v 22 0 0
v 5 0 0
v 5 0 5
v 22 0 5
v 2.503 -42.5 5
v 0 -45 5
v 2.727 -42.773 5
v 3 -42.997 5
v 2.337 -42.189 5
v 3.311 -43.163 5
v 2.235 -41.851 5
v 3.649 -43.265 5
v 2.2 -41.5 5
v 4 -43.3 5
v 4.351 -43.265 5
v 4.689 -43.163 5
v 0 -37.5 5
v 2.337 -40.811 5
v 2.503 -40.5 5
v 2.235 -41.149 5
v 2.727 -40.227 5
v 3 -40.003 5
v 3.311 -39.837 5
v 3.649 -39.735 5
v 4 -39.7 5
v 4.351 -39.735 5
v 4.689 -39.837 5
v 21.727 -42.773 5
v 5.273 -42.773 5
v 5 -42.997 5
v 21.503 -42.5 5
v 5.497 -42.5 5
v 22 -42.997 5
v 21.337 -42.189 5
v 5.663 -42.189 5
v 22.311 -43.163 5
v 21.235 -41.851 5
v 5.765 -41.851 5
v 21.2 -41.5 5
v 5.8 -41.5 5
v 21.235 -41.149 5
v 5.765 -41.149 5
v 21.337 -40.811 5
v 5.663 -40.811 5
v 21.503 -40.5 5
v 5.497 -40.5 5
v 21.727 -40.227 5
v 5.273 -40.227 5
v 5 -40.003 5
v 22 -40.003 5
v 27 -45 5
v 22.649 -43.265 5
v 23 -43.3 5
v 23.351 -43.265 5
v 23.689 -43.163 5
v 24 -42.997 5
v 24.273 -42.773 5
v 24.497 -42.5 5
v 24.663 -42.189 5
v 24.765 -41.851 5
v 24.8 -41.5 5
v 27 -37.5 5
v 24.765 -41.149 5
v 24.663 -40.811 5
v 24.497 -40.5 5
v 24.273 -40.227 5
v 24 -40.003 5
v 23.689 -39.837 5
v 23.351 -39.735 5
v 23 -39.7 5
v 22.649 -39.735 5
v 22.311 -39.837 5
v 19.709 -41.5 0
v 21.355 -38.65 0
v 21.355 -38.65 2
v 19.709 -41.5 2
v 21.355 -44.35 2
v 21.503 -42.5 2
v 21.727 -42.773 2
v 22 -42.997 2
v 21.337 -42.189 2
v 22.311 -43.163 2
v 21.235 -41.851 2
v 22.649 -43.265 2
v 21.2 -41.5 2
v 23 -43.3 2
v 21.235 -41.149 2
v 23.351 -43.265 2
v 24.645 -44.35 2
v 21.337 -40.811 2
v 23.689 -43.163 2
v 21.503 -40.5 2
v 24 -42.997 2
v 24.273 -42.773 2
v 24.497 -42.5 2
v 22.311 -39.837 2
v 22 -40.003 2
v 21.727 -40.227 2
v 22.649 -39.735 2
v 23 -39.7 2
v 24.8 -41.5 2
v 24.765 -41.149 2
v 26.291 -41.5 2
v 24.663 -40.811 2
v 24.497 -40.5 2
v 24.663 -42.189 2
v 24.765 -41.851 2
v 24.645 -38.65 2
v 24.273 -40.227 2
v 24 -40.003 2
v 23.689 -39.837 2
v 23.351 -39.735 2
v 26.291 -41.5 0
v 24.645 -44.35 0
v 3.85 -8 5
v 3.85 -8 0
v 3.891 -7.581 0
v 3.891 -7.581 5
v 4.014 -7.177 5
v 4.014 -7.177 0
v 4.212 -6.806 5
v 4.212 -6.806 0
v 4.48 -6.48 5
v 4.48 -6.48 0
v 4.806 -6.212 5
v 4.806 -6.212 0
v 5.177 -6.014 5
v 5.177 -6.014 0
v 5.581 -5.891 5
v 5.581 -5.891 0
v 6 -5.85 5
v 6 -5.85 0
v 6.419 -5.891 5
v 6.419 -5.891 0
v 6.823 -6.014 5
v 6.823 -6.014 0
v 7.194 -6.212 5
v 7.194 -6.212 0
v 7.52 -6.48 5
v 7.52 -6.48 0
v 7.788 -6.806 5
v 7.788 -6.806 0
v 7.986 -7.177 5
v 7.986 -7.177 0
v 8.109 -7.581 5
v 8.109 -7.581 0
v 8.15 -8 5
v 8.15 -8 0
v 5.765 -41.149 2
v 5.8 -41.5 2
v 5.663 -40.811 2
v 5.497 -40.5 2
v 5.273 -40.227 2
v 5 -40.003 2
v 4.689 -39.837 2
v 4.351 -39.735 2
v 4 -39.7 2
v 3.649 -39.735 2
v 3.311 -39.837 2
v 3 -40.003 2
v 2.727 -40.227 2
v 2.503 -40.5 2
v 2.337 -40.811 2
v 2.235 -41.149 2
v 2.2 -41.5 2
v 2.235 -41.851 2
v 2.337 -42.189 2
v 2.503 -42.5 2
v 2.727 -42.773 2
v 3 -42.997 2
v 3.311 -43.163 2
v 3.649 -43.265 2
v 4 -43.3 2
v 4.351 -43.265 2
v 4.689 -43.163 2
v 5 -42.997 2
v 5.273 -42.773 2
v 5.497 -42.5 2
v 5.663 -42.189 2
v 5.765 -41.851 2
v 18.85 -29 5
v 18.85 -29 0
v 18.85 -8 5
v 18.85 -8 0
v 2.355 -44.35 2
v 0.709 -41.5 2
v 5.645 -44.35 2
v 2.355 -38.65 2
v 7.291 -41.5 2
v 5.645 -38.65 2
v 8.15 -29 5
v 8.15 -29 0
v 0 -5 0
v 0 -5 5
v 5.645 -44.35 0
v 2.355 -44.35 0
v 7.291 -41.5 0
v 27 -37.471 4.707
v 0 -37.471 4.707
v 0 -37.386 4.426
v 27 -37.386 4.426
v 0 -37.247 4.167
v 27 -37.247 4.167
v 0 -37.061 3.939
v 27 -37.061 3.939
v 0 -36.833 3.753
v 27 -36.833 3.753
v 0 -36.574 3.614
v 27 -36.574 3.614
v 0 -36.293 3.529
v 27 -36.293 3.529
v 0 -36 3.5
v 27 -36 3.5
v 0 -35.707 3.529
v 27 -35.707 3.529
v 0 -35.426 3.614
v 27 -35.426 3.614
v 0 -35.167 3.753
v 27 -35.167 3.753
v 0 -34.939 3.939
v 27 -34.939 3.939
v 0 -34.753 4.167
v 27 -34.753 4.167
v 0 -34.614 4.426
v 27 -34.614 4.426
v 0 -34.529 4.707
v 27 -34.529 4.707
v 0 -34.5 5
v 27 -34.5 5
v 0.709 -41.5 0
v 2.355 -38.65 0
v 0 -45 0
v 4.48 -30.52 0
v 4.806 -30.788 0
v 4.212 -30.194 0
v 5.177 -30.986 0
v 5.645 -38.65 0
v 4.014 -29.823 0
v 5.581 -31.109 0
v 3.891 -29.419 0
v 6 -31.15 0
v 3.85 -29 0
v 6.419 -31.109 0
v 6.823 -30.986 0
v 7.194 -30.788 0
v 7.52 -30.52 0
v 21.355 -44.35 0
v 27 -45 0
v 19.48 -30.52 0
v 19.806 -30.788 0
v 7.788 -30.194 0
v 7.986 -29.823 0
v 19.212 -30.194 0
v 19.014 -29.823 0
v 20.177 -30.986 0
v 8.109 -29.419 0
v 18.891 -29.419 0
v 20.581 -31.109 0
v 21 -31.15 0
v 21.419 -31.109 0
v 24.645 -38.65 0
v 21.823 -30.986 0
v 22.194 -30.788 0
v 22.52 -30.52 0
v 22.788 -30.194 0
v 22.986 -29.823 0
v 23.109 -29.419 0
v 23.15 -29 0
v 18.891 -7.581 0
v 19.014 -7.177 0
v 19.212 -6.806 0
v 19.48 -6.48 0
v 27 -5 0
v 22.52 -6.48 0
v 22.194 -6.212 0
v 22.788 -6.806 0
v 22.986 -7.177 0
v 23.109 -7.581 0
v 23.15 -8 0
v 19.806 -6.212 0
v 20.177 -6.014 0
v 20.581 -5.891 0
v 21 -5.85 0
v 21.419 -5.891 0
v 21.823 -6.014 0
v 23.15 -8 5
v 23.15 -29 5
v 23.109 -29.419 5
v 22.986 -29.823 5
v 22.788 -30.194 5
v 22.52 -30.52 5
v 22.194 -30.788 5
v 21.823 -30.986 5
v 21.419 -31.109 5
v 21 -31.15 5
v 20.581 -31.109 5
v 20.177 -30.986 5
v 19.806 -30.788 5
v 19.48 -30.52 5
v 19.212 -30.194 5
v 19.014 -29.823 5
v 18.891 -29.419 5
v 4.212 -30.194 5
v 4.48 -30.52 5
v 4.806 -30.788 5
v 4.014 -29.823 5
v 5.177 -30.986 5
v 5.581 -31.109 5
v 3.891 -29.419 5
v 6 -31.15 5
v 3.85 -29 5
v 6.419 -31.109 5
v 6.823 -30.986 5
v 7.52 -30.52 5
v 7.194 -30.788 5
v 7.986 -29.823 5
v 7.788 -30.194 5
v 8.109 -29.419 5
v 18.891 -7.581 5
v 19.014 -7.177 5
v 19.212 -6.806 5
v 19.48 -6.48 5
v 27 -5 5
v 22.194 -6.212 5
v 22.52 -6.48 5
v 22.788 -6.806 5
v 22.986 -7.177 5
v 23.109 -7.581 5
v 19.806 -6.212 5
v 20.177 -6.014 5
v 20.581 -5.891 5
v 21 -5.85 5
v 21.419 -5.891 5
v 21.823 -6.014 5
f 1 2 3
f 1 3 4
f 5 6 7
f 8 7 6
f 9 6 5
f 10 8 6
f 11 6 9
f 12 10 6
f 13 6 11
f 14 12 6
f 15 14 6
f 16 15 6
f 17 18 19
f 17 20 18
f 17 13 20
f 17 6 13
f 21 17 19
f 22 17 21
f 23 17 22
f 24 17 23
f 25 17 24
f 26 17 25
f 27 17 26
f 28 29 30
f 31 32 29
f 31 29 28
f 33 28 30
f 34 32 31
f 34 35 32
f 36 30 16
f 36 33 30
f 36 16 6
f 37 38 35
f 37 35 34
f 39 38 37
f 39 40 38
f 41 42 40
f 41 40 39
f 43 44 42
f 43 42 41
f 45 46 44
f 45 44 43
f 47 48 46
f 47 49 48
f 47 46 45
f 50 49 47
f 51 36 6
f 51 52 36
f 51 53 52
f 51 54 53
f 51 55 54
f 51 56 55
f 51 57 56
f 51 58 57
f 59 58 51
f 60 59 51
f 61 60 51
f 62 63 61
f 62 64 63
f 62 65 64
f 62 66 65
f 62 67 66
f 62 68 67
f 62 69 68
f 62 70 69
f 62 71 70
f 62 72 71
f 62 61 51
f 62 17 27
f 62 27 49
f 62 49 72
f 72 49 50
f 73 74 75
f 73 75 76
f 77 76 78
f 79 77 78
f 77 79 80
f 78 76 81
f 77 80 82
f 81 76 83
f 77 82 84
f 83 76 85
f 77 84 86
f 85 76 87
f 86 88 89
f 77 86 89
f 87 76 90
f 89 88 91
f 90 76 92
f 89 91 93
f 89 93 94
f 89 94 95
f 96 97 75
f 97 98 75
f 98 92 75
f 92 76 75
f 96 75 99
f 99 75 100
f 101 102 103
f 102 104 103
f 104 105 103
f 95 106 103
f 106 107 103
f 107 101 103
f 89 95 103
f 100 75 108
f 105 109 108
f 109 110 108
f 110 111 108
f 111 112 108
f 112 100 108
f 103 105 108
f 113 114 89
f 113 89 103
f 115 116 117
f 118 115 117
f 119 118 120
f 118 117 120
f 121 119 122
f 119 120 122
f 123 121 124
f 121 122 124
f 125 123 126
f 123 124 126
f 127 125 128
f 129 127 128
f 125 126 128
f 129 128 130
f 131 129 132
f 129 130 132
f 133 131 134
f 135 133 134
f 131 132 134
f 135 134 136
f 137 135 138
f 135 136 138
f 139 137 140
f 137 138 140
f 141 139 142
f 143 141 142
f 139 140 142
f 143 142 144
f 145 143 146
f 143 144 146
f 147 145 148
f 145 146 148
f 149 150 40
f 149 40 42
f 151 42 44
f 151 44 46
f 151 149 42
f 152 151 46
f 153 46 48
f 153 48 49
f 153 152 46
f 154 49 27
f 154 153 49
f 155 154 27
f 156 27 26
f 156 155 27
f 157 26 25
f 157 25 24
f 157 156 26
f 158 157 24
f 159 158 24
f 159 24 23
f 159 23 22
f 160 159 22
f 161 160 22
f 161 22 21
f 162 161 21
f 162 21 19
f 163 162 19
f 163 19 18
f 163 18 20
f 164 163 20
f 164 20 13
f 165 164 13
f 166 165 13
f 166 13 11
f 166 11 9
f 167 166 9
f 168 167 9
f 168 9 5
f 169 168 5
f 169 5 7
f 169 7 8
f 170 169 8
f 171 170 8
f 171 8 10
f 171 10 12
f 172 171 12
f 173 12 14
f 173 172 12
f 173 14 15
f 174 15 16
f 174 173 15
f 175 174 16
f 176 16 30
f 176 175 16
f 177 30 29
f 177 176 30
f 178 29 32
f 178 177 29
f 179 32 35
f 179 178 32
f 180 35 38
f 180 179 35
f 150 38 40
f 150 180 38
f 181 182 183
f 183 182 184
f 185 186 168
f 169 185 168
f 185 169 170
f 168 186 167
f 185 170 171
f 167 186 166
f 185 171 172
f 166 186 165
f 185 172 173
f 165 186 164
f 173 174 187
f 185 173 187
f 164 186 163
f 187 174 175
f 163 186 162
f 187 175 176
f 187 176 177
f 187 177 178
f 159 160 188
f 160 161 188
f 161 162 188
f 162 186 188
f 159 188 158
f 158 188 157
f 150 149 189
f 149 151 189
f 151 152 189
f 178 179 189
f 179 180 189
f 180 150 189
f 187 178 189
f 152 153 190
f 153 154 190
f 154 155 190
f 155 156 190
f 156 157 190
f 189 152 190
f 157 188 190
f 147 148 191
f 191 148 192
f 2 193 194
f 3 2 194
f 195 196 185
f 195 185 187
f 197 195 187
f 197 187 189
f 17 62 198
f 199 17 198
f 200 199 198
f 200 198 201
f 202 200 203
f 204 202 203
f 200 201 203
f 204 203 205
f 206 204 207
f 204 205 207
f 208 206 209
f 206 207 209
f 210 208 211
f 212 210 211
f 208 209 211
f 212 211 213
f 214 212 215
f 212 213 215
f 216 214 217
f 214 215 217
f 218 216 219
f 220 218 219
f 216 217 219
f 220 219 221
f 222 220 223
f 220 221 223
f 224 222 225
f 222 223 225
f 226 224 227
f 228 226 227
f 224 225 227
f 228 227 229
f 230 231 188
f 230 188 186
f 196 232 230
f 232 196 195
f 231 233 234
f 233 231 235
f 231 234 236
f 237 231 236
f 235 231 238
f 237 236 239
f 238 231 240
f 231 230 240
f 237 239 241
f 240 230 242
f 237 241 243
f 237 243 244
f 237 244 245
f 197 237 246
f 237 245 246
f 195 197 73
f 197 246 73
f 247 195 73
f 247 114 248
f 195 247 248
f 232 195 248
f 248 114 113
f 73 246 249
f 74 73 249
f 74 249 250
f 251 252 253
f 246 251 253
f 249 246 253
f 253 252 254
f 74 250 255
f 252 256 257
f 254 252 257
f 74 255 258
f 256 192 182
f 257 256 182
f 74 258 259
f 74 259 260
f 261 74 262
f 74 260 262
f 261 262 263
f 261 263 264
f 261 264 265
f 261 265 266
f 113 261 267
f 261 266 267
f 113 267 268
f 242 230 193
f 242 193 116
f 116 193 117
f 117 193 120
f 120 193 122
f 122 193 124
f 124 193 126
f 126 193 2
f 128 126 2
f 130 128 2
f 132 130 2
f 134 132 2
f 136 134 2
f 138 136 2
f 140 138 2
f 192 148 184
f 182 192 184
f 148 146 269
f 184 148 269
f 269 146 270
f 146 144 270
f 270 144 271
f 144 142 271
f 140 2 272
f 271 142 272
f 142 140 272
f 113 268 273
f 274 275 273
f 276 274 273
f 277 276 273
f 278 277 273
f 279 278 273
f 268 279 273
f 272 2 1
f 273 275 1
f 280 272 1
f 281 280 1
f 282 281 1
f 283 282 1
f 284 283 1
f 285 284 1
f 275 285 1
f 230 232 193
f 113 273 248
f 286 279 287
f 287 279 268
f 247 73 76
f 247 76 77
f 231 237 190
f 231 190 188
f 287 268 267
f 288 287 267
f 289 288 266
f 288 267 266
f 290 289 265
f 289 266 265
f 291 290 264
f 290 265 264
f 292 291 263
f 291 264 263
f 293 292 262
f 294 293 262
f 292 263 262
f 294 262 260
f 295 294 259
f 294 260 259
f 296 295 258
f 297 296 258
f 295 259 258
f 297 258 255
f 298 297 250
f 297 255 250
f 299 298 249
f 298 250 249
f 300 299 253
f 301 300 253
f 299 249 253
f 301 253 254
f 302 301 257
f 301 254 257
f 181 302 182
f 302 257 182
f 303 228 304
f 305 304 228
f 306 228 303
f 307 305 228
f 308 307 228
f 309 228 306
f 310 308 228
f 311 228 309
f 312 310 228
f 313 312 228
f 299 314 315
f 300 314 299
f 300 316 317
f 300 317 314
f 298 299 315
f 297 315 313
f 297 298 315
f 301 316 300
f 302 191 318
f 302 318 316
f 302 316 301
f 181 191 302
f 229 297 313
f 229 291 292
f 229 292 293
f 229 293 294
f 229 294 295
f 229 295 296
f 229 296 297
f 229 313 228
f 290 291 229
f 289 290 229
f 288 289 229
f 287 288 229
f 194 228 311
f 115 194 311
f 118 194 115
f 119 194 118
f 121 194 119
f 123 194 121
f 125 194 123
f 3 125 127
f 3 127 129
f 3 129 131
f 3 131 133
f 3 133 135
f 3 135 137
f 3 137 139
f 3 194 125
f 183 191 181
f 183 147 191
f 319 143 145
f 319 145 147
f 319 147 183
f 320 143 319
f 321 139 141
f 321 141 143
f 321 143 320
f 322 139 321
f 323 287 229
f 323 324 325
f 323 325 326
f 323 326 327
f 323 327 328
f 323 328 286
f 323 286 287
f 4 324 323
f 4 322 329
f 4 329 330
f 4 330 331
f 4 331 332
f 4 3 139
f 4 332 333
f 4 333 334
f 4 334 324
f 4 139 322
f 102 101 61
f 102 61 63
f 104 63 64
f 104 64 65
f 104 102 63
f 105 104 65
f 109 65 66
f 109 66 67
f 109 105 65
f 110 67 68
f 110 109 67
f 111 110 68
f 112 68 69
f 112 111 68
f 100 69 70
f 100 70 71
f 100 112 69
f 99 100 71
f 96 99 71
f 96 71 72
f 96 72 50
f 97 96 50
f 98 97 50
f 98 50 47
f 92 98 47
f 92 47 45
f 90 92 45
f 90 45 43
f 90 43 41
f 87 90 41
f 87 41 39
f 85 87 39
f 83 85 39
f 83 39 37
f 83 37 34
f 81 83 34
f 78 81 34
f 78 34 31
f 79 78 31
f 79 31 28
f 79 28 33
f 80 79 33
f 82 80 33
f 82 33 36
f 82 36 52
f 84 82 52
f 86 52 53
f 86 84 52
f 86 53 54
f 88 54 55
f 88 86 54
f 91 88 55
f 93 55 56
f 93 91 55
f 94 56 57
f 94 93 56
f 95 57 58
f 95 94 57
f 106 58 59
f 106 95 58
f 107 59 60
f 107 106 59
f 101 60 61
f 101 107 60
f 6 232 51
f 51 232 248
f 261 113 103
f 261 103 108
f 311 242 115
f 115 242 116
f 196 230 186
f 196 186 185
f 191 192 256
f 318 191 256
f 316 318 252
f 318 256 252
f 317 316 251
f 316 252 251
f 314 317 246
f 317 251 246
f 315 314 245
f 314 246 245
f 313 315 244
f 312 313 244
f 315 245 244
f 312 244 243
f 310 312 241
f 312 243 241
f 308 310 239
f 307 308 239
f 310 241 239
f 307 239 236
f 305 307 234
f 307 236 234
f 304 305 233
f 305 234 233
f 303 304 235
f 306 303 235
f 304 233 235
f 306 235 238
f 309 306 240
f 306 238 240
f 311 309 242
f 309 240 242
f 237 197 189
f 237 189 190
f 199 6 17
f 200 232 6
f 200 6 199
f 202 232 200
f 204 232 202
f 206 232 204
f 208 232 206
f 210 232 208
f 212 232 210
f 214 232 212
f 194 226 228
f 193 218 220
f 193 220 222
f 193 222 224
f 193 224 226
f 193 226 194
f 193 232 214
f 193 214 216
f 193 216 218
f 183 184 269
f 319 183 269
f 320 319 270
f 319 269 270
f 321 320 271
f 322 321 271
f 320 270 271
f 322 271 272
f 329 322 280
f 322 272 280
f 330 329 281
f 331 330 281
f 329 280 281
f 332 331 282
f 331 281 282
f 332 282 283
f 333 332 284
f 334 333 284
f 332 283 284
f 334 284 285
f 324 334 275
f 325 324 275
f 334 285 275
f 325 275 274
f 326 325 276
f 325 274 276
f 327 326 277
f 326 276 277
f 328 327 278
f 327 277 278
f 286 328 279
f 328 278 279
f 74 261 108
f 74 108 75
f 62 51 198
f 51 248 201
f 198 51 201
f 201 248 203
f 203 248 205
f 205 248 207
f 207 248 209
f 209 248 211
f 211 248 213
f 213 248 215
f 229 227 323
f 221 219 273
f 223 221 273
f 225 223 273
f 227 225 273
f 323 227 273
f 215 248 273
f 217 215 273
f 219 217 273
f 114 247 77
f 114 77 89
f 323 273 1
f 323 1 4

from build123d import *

# Parameters (mm, degrees)
F0_W     = 27
F0_H     = 45
F0_R     = 1.8
F1_DEPTH = 5
F3_DEPTH = 27
F4_DEPTH = 2
F5_SIZE  = 5


with BuildPart() as f1:
    # F0 (on Top) → F1 (new body)
    with BuildSketch(Plane.XY):
        with Locations((13.5, -22.5)):
            Rectangle(F0_W, F0_H)
        Polygon((0.709103, -41.5), (2.354552, -38.65), (5.645448, -38.65), (7.290897, -41.5), (5.645448, -44.35), (2.354552, -44.35), align=None, mode=Mode.SUBTRACT)
        Polygon((19.709103, -41.5), (21.354552, -38.65), (24.645448, -38.65), (26.290897, -41.5), (24.645448, -44.35), (21.354552, -44.35), align=None, mode=Mode.SUBTRACT)
        with BuildLine():
            Line((3.85, -29), (3.85, -8))
            ThreePointArc((3.85, -8), (6, -5.85), (8.15, -8))
            Line((8.15, -8), (8.15, -29))
            ThreePointArc((8.15, -29), (6, -31.15), (3.85, -29))
        make_face(mode=Mode.SUBTRACT)
        with BuildLine():
            Line((18.85, -29), (18.85, -8))
            ThreePointArc((18.85, -8), (21, -5.85), (23.15, -8))
            Line((23.15, -8), (23.15, -29))
            ThreePointArc((23.15, -29), (21, -31.15), (18.85, -29))
        make_face(mode=Mode.SUBTRACT)
        Polygon((24.645448, -38.65), (21.354552, -38.65), (19.709103, -41.5), (21.354552, -44.35), (24.645448, -44.35), (26.290897, -41.5), align=None)
        with Locations((23, -41.5)):
            Circle(F0_R, mode=Mode.SUBTRACT)
        Polygon((5.645448, -38.65), (2.354552, -38.65), (0.709103, -41.5), (2.354552, -44.35), (5.645448, -44.35), (7.290897, -41.5), align=None)
        with Locations((4, -41.5)):
            Circle(F0_R, mode=Mode.SUBTRACT)
    extrude(amount=F1_DEPTH)

    # F2 (on face) → F3 (cut, through all)
    with BuildSketch(Plane.YZ.offset(27)):
        with BuildLine():
            Line((-34.5, 5), (-37.5, 5))
            ThreePointArc((-37.5, 5), (-36, 3.5), (-34.5, 5))
        make_face()
    extrude(amount=-F3_DEPTH, mode=Mode.SUBTRACT)

    # F0 (on Top) → F4 (cut)
    with BuildSketch(Plane.XY):
        with Locations((4, -41.5)):
            Circle(F0_R)
        with Locations((23, -41.5)):
            Circle(F0_R)
        Polygon((5.645448, -38.65), (2.354552, -38.65), (0.709103, -41.5), (2.354552, -44.35), (5.645448, -44.35), (7.290897, -41.5), align=None)
        with Locations((4, -41.5)):
            Circle(F0_R, mode=Mode.SUBTRACT)
        Polygon((24.645448, -38.65), (21.354552, -38.65), (19.709103, -41.5), (21.354552, -44.35), (24.645448, -44.35), (26.290897, -41.5), align=None)
        with Locations((23, -41.5)):
            Circle(F0_R, mode=Mode.SUBTRACT)
    extrude(amount=F4_DEPTH, mode=Mode.SUBTRACT)

    # F5
    f5_edges = [f1.edges().sort_by_distance(p)[0] for p in [
        (0, 0, 2.5),
        (27, 0, 2.5),
    ]]
    chamfer(f5_edges, length=F5_SIZE)


solid = f1.part
